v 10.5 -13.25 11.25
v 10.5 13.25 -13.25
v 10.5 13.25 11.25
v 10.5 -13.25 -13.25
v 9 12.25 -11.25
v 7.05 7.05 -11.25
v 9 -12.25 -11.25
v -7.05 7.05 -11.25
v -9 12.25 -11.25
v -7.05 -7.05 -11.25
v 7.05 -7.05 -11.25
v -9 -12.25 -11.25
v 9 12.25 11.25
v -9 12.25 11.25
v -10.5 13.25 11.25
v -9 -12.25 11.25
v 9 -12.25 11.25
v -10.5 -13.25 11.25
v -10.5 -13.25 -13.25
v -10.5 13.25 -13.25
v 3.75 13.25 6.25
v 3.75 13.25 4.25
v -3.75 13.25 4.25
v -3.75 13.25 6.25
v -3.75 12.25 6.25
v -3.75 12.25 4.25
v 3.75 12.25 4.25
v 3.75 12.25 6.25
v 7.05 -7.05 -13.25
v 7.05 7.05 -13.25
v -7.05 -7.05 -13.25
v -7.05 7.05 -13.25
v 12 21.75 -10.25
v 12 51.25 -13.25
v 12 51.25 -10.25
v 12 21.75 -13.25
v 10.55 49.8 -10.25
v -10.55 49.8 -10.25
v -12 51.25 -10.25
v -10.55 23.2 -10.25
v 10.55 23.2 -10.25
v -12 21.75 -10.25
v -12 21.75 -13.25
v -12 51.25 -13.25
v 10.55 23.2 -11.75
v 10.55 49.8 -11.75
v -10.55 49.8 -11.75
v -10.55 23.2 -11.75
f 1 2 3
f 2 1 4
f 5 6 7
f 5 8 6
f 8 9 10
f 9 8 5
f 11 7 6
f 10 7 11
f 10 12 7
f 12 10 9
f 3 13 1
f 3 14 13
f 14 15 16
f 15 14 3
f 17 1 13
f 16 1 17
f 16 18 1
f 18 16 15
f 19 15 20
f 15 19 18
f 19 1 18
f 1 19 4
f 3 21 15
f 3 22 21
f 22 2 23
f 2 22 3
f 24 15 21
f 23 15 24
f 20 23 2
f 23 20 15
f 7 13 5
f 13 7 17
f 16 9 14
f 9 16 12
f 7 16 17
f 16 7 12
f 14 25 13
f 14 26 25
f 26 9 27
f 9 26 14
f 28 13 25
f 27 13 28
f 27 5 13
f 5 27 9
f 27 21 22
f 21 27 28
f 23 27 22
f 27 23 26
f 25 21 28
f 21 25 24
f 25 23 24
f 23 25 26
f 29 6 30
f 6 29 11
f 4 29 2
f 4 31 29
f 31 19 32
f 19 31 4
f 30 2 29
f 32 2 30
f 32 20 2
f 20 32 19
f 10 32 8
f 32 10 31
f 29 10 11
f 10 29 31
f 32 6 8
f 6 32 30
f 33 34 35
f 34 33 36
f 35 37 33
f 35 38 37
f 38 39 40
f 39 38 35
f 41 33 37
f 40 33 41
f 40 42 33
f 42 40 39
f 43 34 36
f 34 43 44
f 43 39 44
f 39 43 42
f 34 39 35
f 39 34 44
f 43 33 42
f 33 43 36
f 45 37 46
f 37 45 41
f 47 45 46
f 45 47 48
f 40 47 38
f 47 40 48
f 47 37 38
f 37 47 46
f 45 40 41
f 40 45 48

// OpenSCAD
switch_width = 14.1; // .1 for clearance

// outer cube itself
// total height of cube. be sure to factor in some play for the wires!
height = 22.5;
// total depth, or y value, of the cube
depth = 26.5;
// total width, or x value, of the cube
width = 21;
// thickness of longer walls on the cube
long_wall_thickness = 3;
// thickness of shorter walls on the cube
short_wall_thickness = 2;

// micro usb hole
// usb hole width
usb_width = 7.5;
// usb hole depth
usb_depth = depth;
// usb hole height
usb_height = 2;
// height from the bottom that the middle of the usb hole should be at
usb_height_offset = 6;

//top
//thickness of top plate that holds in the switch
top_thickness = 2;

//bottom
//bottom lip width
bottom_padding_width = 3;
// bottom lip depth
bottom_padding_depth = 3;
// bottom lip height. works a bit wonky right now; best to leave it at 1
bottom_padding_height = 1;

//amount of iterations to do for the switch holes. even numbers please! 4 = 2 on each side of the original
switch_hole_iterations = 4;

rotate([180,0,0]){
    difference(){
        cube([width,depth,height], center=true); // outside cube
        cube([width-long_wall_thickness,depth-short_wall_thickness,height], center = true); // inside cube
        
        translate([0,-depth/2,-height/2 + usb_height_offset])
        cube([usb_width,usb_depth,usb_height], center = true); // micro usb hole
    }
    
    // top
    translate([0,0,(height + top_thickness)/2])
    difference(){
        cube([width,depth,top_thickness], center = true);
        for (x = [0:switch_hole_iterations]){
            translate([19 * (x-switch_hole_iterations/2), 0, 0]) 
            cube([switch_width,switch_width,top_thickness], center = true);// switch hole
        }
    }
}

translate([0,depth + 10,-height/2 + (top_thickness + bottom_padding_height)/2 - top_thickness])
difference(){
    cube([width + bottom_padding_width,depth + bottom_padding_depth,top_thickness + bottom_padding_height], center = true);
    translate([0,0,bottom_padding_height]) cube([width+.1,depth+.1,top_thickness], center = true);
}
